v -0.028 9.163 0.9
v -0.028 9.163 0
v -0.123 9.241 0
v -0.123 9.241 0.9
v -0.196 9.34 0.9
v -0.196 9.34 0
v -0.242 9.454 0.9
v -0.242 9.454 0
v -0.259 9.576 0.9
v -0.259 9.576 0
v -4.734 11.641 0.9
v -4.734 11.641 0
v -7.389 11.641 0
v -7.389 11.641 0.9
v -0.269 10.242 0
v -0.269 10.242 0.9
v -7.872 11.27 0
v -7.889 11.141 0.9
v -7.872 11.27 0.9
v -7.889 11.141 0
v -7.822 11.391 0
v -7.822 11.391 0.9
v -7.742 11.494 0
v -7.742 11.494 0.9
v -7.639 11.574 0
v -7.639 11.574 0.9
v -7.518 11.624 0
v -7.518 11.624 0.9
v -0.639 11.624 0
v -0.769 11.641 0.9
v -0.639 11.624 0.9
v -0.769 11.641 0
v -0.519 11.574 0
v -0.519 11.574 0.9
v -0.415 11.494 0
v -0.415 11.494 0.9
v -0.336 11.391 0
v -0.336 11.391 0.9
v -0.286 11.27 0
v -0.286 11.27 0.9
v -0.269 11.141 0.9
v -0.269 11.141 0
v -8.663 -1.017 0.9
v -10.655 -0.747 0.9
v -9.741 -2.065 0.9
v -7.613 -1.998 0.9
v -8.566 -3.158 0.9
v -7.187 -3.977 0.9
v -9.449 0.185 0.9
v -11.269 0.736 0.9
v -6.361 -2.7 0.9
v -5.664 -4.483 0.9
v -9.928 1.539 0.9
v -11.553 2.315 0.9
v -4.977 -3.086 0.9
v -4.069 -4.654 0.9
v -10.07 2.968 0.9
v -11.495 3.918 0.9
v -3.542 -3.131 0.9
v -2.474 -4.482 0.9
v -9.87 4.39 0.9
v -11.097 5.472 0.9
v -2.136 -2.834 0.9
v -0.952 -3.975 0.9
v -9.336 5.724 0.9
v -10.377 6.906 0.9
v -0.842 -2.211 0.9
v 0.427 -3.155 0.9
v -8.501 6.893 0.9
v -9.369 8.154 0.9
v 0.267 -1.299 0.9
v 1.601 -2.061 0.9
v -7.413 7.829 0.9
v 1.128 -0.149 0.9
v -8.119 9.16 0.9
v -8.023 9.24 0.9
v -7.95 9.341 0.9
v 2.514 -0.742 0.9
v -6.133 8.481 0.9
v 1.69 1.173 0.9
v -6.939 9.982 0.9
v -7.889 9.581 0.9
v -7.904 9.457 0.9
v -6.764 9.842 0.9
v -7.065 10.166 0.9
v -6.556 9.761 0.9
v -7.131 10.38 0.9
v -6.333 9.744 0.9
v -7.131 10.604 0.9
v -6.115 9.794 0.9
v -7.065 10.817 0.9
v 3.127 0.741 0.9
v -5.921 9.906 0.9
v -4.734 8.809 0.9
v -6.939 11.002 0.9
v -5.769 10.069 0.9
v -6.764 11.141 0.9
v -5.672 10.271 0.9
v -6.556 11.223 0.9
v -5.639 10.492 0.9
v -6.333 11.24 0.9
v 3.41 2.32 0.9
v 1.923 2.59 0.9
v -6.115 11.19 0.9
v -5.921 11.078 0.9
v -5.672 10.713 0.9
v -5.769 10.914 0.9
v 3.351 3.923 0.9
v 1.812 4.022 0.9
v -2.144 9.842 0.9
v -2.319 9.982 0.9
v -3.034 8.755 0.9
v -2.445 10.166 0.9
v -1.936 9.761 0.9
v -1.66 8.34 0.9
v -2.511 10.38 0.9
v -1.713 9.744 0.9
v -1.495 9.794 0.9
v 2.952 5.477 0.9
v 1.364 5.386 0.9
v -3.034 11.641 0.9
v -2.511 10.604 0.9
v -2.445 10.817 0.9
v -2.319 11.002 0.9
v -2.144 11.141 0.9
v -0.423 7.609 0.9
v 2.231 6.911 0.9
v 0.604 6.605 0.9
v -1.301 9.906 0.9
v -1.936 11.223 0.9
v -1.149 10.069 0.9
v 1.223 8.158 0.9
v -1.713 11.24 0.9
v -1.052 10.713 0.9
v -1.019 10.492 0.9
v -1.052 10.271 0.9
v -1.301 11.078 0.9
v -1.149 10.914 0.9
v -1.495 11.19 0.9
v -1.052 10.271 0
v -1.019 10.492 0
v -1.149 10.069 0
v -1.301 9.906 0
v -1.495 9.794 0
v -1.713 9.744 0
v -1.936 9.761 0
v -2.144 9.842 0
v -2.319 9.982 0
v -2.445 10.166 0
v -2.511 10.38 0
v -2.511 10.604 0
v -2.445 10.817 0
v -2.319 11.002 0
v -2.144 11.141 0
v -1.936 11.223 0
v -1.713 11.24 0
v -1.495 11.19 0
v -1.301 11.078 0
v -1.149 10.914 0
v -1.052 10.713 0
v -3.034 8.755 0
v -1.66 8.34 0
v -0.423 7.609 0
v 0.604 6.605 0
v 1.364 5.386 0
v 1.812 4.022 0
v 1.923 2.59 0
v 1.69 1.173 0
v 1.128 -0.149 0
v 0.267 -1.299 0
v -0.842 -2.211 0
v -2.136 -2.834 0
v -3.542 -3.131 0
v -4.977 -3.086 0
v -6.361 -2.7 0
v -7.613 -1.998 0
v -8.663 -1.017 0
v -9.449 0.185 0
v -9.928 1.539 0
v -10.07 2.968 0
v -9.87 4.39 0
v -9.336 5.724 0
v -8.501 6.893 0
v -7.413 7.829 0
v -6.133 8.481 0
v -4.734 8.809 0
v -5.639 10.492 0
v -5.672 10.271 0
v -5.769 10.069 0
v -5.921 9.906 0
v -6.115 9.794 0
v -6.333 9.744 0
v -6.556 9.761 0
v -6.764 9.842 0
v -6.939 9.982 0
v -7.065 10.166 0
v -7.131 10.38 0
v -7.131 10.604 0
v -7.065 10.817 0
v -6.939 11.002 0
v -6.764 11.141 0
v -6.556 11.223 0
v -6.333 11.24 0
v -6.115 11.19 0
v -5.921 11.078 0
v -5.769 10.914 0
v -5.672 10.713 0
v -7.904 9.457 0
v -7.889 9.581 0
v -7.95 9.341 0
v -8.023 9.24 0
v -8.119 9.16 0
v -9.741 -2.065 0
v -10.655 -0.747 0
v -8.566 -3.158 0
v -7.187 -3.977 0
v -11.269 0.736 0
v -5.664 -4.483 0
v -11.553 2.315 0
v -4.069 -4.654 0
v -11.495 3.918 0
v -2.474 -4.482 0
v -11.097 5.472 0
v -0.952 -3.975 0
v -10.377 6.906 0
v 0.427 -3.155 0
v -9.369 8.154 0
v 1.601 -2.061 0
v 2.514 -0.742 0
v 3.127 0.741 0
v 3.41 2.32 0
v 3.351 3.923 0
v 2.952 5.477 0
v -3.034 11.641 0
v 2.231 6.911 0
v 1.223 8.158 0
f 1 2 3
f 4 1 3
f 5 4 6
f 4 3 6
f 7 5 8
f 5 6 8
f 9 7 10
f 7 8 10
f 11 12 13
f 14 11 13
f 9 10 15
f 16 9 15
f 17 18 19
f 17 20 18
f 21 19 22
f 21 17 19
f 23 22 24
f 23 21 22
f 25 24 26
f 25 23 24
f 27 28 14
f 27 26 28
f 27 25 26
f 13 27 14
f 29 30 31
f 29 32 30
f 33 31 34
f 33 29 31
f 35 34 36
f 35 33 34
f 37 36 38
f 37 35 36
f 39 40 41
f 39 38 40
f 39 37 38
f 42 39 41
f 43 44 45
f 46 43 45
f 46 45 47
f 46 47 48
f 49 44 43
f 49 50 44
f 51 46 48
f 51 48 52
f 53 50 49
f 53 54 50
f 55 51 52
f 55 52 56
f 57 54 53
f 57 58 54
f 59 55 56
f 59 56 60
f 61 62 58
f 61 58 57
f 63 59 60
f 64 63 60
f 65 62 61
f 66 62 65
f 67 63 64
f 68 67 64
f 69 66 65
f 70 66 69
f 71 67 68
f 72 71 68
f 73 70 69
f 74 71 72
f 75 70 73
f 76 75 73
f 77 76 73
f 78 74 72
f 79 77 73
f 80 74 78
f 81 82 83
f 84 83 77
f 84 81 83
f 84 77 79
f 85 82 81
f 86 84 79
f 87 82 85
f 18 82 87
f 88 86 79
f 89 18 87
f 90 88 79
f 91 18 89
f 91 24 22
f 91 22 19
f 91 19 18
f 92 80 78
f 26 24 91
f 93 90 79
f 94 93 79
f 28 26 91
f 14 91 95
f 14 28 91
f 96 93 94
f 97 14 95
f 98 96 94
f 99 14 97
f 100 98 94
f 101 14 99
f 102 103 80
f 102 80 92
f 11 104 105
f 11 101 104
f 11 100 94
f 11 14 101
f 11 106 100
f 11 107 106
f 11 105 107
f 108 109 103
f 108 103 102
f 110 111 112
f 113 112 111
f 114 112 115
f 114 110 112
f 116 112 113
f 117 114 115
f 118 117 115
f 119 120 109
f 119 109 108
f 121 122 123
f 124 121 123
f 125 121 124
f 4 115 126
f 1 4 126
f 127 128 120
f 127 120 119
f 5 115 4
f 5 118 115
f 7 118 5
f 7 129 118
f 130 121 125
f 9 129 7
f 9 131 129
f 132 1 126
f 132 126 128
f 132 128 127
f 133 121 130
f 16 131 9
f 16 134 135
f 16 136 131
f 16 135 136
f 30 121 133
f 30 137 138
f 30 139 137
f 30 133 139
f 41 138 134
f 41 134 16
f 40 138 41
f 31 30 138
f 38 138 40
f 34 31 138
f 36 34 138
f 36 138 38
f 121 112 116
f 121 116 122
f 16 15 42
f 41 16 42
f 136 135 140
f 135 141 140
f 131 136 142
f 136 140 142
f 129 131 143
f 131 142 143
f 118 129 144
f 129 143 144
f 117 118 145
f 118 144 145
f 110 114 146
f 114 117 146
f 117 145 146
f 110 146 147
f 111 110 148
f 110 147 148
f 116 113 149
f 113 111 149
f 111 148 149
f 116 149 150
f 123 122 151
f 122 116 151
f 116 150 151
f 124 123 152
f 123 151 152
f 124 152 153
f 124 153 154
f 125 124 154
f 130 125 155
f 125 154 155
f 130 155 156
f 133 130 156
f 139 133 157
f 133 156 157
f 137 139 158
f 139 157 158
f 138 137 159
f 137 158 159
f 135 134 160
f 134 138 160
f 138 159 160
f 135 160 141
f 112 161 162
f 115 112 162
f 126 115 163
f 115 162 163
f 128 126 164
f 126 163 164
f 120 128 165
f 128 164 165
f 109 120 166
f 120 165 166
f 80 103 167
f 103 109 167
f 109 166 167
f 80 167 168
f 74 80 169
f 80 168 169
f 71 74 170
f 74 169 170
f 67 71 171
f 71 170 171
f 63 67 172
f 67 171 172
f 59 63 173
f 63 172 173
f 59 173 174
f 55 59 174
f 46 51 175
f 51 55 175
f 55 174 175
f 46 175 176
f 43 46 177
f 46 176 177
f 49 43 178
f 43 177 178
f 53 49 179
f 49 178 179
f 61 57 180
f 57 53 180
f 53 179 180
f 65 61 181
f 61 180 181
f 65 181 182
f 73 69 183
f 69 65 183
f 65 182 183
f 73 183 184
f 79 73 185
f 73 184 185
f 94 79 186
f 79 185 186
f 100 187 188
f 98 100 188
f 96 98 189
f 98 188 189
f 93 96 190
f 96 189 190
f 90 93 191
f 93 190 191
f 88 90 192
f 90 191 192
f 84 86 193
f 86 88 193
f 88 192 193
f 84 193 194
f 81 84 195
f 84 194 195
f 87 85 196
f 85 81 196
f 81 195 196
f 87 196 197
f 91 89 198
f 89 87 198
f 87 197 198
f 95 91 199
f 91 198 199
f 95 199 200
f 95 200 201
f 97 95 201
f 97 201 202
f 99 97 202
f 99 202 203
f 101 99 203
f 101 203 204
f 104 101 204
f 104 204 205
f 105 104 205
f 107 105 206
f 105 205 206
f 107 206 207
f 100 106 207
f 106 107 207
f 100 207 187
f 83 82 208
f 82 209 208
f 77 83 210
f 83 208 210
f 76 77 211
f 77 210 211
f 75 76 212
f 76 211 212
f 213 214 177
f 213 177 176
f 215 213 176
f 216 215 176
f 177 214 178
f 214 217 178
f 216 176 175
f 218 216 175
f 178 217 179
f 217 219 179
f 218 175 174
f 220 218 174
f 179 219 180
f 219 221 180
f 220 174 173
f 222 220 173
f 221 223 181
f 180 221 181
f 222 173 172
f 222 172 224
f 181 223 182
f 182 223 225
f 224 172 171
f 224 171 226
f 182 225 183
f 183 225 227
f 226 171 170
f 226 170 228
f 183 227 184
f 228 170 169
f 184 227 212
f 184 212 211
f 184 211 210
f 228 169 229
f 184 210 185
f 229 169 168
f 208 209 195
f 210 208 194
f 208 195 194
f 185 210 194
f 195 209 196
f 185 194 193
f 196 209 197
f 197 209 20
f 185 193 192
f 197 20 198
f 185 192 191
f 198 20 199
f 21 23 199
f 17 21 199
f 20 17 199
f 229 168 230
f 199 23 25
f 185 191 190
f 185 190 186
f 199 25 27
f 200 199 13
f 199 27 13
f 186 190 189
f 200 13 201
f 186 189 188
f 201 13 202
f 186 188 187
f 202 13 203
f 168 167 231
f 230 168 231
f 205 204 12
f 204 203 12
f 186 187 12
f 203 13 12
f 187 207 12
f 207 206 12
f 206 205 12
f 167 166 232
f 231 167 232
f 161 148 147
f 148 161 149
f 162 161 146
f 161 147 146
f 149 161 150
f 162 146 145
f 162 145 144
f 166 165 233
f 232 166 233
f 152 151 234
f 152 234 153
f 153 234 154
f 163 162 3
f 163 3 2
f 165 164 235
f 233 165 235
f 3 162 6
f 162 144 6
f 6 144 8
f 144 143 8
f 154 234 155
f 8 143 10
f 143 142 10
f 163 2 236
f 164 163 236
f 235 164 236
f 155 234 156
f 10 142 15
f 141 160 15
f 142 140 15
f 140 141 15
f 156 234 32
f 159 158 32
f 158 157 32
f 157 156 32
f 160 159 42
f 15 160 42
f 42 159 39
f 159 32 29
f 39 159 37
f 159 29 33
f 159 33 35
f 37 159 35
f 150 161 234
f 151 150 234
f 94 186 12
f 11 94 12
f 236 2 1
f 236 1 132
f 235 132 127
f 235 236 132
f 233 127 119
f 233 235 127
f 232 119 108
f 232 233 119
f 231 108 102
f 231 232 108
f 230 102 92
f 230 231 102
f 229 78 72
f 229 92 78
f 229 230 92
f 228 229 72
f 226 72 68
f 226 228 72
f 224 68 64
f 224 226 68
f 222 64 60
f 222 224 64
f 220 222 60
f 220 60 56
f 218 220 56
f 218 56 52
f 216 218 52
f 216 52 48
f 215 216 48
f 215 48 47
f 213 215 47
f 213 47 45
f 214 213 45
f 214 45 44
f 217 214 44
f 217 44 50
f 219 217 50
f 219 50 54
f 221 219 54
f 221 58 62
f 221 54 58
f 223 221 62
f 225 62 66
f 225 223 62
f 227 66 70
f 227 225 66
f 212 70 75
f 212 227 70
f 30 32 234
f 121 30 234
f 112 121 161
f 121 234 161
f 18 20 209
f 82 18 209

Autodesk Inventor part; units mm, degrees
ref_plane "YZ Plane" through (0, 0, 0) normal (1, 0, 0) x (0, 1, 0)
ref_plane "XZ Plane" through (0, 0, 0) normal (0, 1, 0) x (-1, 0, 0)
ref_plane "XY Plane" through (0, 0, 0) normal (0, 0, 1) x (1, 0, 0)
sketch "Sketch1" plane through (0, 0, 0) normal (0, 0, 1) x (1, 0, 0)
  arc A0 (-4.7345, 8.809) -> (-3.0345, 8.7554) centre (-4.0716, 2.8457) ccw
  line L0 (-0.2689, 9.3429) -> (-0.2689, 11.1409)
  line L1 (-0.7689, 11.6409) -> (-3.0345, 11.6409)
  line L2 (-7.8889, 11.1409) -> (-7.8889, 9.5807)
  circle A1 centre (-1.7689, 10.4919) radius 0.75
  circle A2 centre (-6.3889, 10.4919) radius 0.75
  arc A3 (-8.1191, 9.1598) -> (-0.0285, 9.1626) centre (-4.0716, 2.8457) ccw
  line L3 (-3.0345, 11.6409) -> (-3.0345, 8.7554)
  line L4 (-4.7345, 8.7554) -> (-4.7345, 11.6409)
  line L5 (-4.7345, 11.6409) -> (-7.3889, 11.6409)
  arc A4 (-0.2689, 11.1409) -> (-0.7689, 11.6409) centre (-0.7689, 11.1409) ccw
  arc A5 (-7.3889, 11.6409) -> (-7.8889, 11.1409) centre (-7.3889, 11.1409) ccw
  line L6 (-0.2589, 9.5762) -> (-0.2689, 10.2419)
  arc A6 (-0.2589, 9.5762) -> (-0.0285, 9.1626) centre (0.2411, 9.5837) ccw
  arc A7 (-8.1191, 9.1598) -> (-7.8889, 9.5807) centre (-8.3889, 9.5807) ccw
  point P0 (0, 0)
  point P1 (-7.8889, 9.3015)
  point P2 (-0.2547, 9.3018)
  dimension "d0" = 12
  dimension "d3" = 1.5
  dimension "d4" = 1.5
  dimension "d5" = 7.62
  dimension "d6" = 1.7
  dimension "d7" = 0.75
  dimension "d8" = 0.75
  dimension "d9" = 0.5
  dimension "d12" = 0.5
  dimension "d13" = 0.5
  dimension "d14" = 7.5
extrude "Extrusion1" add sketch "Sketch1" along normal blind 0.9
properties part number "Laasering"
